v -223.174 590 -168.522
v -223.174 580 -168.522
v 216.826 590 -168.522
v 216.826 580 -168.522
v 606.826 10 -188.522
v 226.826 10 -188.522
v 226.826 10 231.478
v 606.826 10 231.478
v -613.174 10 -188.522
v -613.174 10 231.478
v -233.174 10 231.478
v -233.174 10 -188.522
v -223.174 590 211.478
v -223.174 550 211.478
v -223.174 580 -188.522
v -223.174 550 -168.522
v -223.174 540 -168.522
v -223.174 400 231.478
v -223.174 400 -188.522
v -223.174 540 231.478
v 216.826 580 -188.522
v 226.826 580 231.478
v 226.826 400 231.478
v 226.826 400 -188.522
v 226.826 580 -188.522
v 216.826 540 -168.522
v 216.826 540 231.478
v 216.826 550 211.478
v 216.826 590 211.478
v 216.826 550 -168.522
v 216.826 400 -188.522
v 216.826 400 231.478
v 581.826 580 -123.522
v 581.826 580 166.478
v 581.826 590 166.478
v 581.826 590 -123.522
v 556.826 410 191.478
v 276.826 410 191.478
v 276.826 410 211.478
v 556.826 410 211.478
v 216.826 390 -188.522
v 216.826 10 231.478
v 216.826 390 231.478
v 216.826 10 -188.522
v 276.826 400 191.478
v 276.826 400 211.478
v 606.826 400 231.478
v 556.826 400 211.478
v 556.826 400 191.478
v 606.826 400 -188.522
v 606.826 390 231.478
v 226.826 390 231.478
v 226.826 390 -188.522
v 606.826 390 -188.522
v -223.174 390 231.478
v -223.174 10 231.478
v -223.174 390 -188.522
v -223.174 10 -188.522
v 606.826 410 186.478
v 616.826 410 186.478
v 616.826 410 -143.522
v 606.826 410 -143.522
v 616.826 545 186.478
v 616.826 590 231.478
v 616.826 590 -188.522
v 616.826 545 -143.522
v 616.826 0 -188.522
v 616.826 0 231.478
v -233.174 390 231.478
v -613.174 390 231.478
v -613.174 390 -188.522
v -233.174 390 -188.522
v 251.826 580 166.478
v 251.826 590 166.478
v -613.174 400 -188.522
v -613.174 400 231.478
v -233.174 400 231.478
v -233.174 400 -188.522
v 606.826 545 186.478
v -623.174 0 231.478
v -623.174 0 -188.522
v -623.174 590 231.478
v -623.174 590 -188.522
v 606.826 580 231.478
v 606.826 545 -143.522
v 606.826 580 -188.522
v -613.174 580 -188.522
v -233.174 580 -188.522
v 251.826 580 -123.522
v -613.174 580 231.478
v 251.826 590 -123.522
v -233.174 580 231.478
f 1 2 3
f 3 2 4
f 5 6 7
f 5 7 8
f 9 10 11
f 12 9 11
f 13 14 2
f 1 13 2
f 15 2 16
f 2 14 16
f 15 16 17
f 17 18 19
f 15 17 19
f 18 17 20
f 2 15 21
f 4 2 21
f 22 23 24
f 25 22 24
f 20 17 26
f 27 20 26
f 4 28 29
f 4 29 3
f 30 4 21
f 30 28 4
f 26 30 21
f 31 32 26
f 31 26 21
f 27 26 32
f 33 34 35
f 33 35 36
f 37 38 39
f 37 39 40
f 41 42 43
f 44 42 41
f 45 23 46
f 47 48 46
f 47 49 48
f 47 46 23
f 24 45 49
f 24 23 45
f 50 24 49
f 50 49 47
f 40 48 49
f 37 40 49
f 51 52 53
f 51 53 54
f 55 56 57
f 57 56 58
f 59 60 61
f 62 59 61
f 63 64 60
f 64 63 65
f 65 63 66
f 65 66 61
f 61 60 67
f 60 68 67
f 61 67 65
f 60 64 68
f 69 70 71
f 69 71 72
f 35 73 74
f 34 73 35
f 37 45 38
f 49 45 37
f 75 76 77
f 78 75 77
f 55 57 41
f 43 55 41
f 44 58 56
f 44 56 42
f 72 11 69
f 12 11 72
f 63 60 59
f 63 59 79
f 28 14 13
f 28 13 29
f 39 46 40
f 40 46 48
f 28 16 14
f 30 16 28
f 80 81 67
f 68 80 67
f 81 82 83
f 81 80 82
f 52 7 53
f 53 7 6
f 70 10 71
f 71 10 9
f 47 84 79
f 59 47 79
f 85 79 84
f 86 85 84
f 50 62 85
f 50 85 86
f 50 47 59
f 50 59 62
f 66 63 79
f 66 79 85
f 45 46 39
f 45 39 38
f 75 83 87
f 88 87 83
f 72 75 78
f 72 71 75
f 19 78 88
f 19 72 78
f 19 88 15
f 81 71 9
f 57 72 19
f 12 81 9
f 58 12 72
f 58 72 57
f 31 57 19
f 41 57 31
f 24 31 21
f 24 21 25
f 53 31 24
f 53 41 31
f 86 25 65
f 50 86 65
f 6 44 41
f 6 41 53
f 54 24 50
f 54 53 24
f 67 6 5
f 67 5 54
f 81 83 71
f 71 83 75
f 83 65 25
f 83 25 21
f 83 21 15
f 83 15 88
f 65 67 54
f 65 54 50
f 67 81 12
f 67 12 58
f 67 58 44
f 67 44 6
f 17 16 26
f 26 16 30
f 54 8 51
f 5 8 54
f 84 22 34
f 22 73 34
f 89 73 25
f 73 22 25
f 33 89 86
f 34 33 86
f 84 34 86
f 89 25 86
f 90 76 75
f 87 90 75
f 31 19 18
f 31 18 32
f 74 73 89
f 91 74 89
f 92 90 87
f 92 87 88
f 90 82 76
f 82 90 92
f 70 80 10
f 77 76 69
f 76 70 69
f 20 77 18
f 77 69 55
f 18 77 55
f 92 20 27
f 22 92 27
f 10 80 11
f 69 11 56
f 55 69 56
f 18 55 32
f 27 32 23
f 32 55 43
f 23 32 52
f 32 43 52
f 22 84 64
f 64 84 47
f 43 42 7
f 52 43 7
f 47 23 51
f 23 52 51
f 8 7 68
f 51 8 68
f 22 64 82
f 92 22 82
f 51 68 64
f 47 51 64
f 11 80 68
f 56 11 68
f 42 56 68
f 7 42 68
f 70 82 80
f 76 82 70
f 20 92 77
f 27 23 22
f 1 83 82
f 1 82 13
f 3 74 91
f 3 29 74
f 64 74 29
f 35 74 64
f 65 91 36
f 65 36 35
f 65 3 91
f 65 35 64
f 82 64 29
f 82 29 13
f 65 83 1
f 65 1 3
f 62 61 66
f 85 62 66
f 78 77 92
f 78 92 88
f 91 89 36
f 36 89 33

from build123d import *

# Parameters (mm, degrees)
BASE_W                   = 440
BASE_H                   = 420
PLANCHE_BAS_DEPTH        = 10
BASE_W_2                 = 380
PLANCHE_BAS_2_DEPTH      = 10
PLANCHE_BAS_3_DEPTH      = 10
BASE_6_W                 = 10
BASE_6_H                 = 420
PANNEAUX_LATERAUX_DEPTH  = 580
BASE_7_W                 = 10
BASE_7_H                 = 420
PANNEAUX_BAS_INTER_DEPTH = 390
ESQUISSE2_W              = 380
ESQUISSE2_H              = 420
BOSS_EXTRU_9_DEPTH       = 10
ESQUISSE2_W_2            = 440
BOSS_EXTRU_9_2_DEPTH     = 10
ESQUISSE2_W_3            = 280
ESQUISSE2_H_2            = 20
BOSS_EXTRU_9_3_DEPTH     = 10
ESQUISSE2_4_W            = 10
ESQUISSE2_4_H            = 420
BOSS_EXTRU_10_DEPTH      = 190
ESQUISSE5_W              = 1240
ESQUISSE5_H              = 420
ESQUISSE5_W_2            = 330
ESQUISSE5_H_2            = 290
ESQUISSE5_W_3            = 440
ESQUISSE5_H_3            = 380
BOSS_EXTRU_11_DEPTH      = 10
ESQUISSE7_W              = 440
ESQUISSE7_H              = 380
BOSS_EXTRU_12_DEPTH      = 10
BOSS_EXTRU_13_DEPTH      = 30
BOSS_EXTRU_13_DEPTH_BACK = 10
ESQUISSE7_3_W            = 440
ESQUISSE7_3_H            = 20
ESQUISSE8_W              = 330
ESQUISSE8_H              = 135
ENL_V_MAT_EXTRU_3_DEPTH  = 10
ESQUISSE2_5_W            = 280
ESQUISSE2_5_H            = 20
BOSS_EXTRU_14_DEPTH      = 20


with BuildPart() as part:
    # base → planche_bas (new body)
    with BuildSketch(Plane(origin=(0, 0, 0), x_dir=(1, 0, 0), z_dir=(0, 1, 0))):
        with Locations((-3.173777315, -21.477627471)):
            Rectangle(BASE_W, BASE_H)
    extrude(amount=PLANCHE_BAS_DEPTH)



with BuildPart() as body_2:
    # base → planche_bas 2 (new body)
    with BuildSketch(Plane(origin=(0, 0, 0), x_dir=(1, 0, 0), z_dir=(0, 1, 0))):
        with Locations((-423.173777315, -21.477627471)):
            Rectangle(BASE_W_2, BASE_H)
    extrude(amount=PLANCHE_BAS_2_DEPTH)



with BuildPart() as body_3:
    # base → planche_bas 3 (new body)
    with BuildSketch(Plane(origin=(0, 0, 0), x_dir=(1, 0, 0), z_dir=(0, 1, 0))):
        with Locations((416.826222685, -21.477627471)):
            Rectangle(BASE_W_2, BASE_H)
    extrude(amount=PLANCHE_BAS_3_DEPTH)


with BuildPart() as body_2_1:
    add(body_2.part)

    add(body_3.part)  # panneaux_lateraux merges body 3
    # base<6> → panneaux_lateraux (add)
    with BuildSketch(Plane(origin=(0, 0, 0), x_dir=(1, 0, 0), z_dir=(0, 1, 0))):
        with Locations((-618.173777315, -21.477627471)):
            Rectangle(BASE_6_W, BASE_6_H)
        with Locations((611.826222685, -21.477627471)):
            Rectangle(BASE_6_W, BASE_6_H)
    extrude(amount=PANNEAUX_LATERAUX_DEPTH)


with BuildPart() as part_1:
    add(part.part)

    add(body_2_1.part)  # panneaux_bas_inter merges body 2
    # base<7> → panneaux_bas_inter (add)
    with BuildSketch(Plane(origin=(0, 0, 0), x_dir=(1, 0, 0), z_dir=(0, 1, 0))):
        with Locations((-228.173777315, -21.477627471)):
            Rectangle(BASE_7_W, BASE_7_H)
        with Locations((221.826222685, -21.477627471)):
            Rectangle(BASE_7_W, BASE_7_H)
    extrude(amount=PANNEAUX_BAS_INTER_DEPTH)



with BuildPart() as body_2_2:
    # Esquisse2 → Boss.-Extru.9 (new body)
    with BuildSketch(Plane(origin=(0, 390, 0), x_dir=(1, 0, 0), z_dir=(0, 1, 0))):
        with Locations((-423.173777315, -21.477627471)):
            Rectangle(ESQUISSE2_W, ESQUISSE2_H)
    extrude(amount=BOSS_EXTRU_9_DEPTH)


with BuildPart() as body_3_2:
    # Esquisse2 → Boss.-Extru.9 2 (new body)
    with BuildSketch(Plane(origin=(0, 390, 0), x_dir=(1, 0, 0), z_dir=(0, 1, 0))):
        with Locations((-3.173777315, -21.477627471)):
            Rectangle(ESQUISSE2_W_2, ESQUISSE2_H)
    extrude(amount=BOSS_EXTRU_9_2_DEPTH)


with BuildPart() as body_4:
    # Esquisse2 → Boss.-Extru.9 3 (new body)
    with BuildSketch(Plane(origin=(0, 390, 0), x_dir=(1, 0, 0), z_dir=(0, 1, 0))):
        with Locations((416.826222685, -21.477627471)):
            Rectangle(ESQUISSE2_W, ESQUISSE2_H)
        with Locations((416.826222685, -201.477627471)):
            Rectangle(ESQUISSE2_W_3, ESQUISSE2_H_2, mode=Mode.SUBTRACT)
    extrude(amount=BOSS_EXTRU_9_3_DEPTH)


with BuildPart() as part_2:
    add(part_1.part)

    add(body_2_2.part)  # Boss.-Extru.10 merges body 2 2

    add(body_3_2.part)  # Boss.-Extru.10 merges body 3 2

    add(body_4.part)  # Boss.-Extru.10 merges body 4
    # Esquisse2<4> → Boss.-Extru.10 (add)
    with BuildSketch(Plane(origin=(0, 390, 0), x_dir=(1, 0, 0), z_dir=(0, 1, 0))):
        with Locations((-228.173777315, -21.477627471)):
            Rectangle(ESQUISSE2_4_W, ESQUISSE2_4_H)
        with Locations((221.826222685, -21.477627471)):
            Rectangle(ESQUISSE2_4_W, ESQUISSE2_4_H)
    extrude(amount=BOSS_EXTRU_10_DEPTH)

    # Esquisse5 → Boss.-Extru.11 (add)
    with BuildSketch(Plane(origin=(0, 580, 0), x_dir=(1, 0, 0), z_dir=(0, 1, 0))):
        with Locations((-3.173777315, -21.477627471)):
            Rectangle(ESQUISSE5_W, ESQUISSE5_H)
        with Locations((416.826222685, -21.477627471)):
            Rectangle(ESQUISSE5_W_2, ESQUISSE5_H_2, mode=Mode.SUBTRACT)
        with Locations((-3.173777315, -21.477627471)):
            Rectangle(ESQUISSE5_W_3, ESQUISSE5_H_3, mode=Mode.SUBTRACT)
    extrude(amount=BOSS_EXTRU_11_DEPTH)

    # Esquisse7 → Boss.-Extru.12 (add)
    with BuildSketch(Plane(origin=(0, 550, 0), x_dir=(1, 0, 0), z_dir=(0, 1, 0))):
        with Locations((-3.173777315, -21.477627471)):
            Rectangle(ESQUISSE7_W, ESQUISSE7_H)
    extrude(amount=-BOSS_EXTRU_12_DEPTH)

    # Esquisse7<3> → Boss.-Extru.13 (add, two sides: drawn at the far end of the back side and taken through both)
    with BuildSketch(Plane(origin=(0, 550, 0), x_dir=(1, 0, 0), z_dir=(0, 1, 0)).offset(-BOSS_EXTRU_13_DEPTH_BACK)):
        with Locations((-3.173777315, -221.477627471)):
            Rectangle(ESQUISSE7_3_W, ESQUISSE7_3_H)
    extrude(amount=BOSS_EXTRU_13_DEPTH + BOSS_EXTRU_13_DEPTH_BACK)

    # Esquisse8 → Enlèv. mat.-Extru.3 (cut)
    with BuildSketch(Plane(origin=(616.826222685, 0, 0), x_dir=(0, 0, -1), z_dir=(1, 0, 0))):
        with Locations((-21.477627471, 477.5)):
            Rectangle(ESQUISSE8_W, ESQUISSE8_H)
    extrude(amount=-ENL_V_MAT_EXTRU_3_DEPTH, mode=Mode.SUBTRACT)

    # Esquisse2<5> → Boss.-Extru.14 (add)
    with BuildSketch(Plane(origin=(0, 390, 0), x_dir=(1, 0, 0), z_dir=(0, 1, 0))):
        with Locations((416.826222685, -201.477627471)):
            Rectangle(ESQUISSE2_5_W, ESQUISSE2_5_H)
    extrude(amount=BOSS_EXTRU_14_DEPTH)


solid = part_2.part
